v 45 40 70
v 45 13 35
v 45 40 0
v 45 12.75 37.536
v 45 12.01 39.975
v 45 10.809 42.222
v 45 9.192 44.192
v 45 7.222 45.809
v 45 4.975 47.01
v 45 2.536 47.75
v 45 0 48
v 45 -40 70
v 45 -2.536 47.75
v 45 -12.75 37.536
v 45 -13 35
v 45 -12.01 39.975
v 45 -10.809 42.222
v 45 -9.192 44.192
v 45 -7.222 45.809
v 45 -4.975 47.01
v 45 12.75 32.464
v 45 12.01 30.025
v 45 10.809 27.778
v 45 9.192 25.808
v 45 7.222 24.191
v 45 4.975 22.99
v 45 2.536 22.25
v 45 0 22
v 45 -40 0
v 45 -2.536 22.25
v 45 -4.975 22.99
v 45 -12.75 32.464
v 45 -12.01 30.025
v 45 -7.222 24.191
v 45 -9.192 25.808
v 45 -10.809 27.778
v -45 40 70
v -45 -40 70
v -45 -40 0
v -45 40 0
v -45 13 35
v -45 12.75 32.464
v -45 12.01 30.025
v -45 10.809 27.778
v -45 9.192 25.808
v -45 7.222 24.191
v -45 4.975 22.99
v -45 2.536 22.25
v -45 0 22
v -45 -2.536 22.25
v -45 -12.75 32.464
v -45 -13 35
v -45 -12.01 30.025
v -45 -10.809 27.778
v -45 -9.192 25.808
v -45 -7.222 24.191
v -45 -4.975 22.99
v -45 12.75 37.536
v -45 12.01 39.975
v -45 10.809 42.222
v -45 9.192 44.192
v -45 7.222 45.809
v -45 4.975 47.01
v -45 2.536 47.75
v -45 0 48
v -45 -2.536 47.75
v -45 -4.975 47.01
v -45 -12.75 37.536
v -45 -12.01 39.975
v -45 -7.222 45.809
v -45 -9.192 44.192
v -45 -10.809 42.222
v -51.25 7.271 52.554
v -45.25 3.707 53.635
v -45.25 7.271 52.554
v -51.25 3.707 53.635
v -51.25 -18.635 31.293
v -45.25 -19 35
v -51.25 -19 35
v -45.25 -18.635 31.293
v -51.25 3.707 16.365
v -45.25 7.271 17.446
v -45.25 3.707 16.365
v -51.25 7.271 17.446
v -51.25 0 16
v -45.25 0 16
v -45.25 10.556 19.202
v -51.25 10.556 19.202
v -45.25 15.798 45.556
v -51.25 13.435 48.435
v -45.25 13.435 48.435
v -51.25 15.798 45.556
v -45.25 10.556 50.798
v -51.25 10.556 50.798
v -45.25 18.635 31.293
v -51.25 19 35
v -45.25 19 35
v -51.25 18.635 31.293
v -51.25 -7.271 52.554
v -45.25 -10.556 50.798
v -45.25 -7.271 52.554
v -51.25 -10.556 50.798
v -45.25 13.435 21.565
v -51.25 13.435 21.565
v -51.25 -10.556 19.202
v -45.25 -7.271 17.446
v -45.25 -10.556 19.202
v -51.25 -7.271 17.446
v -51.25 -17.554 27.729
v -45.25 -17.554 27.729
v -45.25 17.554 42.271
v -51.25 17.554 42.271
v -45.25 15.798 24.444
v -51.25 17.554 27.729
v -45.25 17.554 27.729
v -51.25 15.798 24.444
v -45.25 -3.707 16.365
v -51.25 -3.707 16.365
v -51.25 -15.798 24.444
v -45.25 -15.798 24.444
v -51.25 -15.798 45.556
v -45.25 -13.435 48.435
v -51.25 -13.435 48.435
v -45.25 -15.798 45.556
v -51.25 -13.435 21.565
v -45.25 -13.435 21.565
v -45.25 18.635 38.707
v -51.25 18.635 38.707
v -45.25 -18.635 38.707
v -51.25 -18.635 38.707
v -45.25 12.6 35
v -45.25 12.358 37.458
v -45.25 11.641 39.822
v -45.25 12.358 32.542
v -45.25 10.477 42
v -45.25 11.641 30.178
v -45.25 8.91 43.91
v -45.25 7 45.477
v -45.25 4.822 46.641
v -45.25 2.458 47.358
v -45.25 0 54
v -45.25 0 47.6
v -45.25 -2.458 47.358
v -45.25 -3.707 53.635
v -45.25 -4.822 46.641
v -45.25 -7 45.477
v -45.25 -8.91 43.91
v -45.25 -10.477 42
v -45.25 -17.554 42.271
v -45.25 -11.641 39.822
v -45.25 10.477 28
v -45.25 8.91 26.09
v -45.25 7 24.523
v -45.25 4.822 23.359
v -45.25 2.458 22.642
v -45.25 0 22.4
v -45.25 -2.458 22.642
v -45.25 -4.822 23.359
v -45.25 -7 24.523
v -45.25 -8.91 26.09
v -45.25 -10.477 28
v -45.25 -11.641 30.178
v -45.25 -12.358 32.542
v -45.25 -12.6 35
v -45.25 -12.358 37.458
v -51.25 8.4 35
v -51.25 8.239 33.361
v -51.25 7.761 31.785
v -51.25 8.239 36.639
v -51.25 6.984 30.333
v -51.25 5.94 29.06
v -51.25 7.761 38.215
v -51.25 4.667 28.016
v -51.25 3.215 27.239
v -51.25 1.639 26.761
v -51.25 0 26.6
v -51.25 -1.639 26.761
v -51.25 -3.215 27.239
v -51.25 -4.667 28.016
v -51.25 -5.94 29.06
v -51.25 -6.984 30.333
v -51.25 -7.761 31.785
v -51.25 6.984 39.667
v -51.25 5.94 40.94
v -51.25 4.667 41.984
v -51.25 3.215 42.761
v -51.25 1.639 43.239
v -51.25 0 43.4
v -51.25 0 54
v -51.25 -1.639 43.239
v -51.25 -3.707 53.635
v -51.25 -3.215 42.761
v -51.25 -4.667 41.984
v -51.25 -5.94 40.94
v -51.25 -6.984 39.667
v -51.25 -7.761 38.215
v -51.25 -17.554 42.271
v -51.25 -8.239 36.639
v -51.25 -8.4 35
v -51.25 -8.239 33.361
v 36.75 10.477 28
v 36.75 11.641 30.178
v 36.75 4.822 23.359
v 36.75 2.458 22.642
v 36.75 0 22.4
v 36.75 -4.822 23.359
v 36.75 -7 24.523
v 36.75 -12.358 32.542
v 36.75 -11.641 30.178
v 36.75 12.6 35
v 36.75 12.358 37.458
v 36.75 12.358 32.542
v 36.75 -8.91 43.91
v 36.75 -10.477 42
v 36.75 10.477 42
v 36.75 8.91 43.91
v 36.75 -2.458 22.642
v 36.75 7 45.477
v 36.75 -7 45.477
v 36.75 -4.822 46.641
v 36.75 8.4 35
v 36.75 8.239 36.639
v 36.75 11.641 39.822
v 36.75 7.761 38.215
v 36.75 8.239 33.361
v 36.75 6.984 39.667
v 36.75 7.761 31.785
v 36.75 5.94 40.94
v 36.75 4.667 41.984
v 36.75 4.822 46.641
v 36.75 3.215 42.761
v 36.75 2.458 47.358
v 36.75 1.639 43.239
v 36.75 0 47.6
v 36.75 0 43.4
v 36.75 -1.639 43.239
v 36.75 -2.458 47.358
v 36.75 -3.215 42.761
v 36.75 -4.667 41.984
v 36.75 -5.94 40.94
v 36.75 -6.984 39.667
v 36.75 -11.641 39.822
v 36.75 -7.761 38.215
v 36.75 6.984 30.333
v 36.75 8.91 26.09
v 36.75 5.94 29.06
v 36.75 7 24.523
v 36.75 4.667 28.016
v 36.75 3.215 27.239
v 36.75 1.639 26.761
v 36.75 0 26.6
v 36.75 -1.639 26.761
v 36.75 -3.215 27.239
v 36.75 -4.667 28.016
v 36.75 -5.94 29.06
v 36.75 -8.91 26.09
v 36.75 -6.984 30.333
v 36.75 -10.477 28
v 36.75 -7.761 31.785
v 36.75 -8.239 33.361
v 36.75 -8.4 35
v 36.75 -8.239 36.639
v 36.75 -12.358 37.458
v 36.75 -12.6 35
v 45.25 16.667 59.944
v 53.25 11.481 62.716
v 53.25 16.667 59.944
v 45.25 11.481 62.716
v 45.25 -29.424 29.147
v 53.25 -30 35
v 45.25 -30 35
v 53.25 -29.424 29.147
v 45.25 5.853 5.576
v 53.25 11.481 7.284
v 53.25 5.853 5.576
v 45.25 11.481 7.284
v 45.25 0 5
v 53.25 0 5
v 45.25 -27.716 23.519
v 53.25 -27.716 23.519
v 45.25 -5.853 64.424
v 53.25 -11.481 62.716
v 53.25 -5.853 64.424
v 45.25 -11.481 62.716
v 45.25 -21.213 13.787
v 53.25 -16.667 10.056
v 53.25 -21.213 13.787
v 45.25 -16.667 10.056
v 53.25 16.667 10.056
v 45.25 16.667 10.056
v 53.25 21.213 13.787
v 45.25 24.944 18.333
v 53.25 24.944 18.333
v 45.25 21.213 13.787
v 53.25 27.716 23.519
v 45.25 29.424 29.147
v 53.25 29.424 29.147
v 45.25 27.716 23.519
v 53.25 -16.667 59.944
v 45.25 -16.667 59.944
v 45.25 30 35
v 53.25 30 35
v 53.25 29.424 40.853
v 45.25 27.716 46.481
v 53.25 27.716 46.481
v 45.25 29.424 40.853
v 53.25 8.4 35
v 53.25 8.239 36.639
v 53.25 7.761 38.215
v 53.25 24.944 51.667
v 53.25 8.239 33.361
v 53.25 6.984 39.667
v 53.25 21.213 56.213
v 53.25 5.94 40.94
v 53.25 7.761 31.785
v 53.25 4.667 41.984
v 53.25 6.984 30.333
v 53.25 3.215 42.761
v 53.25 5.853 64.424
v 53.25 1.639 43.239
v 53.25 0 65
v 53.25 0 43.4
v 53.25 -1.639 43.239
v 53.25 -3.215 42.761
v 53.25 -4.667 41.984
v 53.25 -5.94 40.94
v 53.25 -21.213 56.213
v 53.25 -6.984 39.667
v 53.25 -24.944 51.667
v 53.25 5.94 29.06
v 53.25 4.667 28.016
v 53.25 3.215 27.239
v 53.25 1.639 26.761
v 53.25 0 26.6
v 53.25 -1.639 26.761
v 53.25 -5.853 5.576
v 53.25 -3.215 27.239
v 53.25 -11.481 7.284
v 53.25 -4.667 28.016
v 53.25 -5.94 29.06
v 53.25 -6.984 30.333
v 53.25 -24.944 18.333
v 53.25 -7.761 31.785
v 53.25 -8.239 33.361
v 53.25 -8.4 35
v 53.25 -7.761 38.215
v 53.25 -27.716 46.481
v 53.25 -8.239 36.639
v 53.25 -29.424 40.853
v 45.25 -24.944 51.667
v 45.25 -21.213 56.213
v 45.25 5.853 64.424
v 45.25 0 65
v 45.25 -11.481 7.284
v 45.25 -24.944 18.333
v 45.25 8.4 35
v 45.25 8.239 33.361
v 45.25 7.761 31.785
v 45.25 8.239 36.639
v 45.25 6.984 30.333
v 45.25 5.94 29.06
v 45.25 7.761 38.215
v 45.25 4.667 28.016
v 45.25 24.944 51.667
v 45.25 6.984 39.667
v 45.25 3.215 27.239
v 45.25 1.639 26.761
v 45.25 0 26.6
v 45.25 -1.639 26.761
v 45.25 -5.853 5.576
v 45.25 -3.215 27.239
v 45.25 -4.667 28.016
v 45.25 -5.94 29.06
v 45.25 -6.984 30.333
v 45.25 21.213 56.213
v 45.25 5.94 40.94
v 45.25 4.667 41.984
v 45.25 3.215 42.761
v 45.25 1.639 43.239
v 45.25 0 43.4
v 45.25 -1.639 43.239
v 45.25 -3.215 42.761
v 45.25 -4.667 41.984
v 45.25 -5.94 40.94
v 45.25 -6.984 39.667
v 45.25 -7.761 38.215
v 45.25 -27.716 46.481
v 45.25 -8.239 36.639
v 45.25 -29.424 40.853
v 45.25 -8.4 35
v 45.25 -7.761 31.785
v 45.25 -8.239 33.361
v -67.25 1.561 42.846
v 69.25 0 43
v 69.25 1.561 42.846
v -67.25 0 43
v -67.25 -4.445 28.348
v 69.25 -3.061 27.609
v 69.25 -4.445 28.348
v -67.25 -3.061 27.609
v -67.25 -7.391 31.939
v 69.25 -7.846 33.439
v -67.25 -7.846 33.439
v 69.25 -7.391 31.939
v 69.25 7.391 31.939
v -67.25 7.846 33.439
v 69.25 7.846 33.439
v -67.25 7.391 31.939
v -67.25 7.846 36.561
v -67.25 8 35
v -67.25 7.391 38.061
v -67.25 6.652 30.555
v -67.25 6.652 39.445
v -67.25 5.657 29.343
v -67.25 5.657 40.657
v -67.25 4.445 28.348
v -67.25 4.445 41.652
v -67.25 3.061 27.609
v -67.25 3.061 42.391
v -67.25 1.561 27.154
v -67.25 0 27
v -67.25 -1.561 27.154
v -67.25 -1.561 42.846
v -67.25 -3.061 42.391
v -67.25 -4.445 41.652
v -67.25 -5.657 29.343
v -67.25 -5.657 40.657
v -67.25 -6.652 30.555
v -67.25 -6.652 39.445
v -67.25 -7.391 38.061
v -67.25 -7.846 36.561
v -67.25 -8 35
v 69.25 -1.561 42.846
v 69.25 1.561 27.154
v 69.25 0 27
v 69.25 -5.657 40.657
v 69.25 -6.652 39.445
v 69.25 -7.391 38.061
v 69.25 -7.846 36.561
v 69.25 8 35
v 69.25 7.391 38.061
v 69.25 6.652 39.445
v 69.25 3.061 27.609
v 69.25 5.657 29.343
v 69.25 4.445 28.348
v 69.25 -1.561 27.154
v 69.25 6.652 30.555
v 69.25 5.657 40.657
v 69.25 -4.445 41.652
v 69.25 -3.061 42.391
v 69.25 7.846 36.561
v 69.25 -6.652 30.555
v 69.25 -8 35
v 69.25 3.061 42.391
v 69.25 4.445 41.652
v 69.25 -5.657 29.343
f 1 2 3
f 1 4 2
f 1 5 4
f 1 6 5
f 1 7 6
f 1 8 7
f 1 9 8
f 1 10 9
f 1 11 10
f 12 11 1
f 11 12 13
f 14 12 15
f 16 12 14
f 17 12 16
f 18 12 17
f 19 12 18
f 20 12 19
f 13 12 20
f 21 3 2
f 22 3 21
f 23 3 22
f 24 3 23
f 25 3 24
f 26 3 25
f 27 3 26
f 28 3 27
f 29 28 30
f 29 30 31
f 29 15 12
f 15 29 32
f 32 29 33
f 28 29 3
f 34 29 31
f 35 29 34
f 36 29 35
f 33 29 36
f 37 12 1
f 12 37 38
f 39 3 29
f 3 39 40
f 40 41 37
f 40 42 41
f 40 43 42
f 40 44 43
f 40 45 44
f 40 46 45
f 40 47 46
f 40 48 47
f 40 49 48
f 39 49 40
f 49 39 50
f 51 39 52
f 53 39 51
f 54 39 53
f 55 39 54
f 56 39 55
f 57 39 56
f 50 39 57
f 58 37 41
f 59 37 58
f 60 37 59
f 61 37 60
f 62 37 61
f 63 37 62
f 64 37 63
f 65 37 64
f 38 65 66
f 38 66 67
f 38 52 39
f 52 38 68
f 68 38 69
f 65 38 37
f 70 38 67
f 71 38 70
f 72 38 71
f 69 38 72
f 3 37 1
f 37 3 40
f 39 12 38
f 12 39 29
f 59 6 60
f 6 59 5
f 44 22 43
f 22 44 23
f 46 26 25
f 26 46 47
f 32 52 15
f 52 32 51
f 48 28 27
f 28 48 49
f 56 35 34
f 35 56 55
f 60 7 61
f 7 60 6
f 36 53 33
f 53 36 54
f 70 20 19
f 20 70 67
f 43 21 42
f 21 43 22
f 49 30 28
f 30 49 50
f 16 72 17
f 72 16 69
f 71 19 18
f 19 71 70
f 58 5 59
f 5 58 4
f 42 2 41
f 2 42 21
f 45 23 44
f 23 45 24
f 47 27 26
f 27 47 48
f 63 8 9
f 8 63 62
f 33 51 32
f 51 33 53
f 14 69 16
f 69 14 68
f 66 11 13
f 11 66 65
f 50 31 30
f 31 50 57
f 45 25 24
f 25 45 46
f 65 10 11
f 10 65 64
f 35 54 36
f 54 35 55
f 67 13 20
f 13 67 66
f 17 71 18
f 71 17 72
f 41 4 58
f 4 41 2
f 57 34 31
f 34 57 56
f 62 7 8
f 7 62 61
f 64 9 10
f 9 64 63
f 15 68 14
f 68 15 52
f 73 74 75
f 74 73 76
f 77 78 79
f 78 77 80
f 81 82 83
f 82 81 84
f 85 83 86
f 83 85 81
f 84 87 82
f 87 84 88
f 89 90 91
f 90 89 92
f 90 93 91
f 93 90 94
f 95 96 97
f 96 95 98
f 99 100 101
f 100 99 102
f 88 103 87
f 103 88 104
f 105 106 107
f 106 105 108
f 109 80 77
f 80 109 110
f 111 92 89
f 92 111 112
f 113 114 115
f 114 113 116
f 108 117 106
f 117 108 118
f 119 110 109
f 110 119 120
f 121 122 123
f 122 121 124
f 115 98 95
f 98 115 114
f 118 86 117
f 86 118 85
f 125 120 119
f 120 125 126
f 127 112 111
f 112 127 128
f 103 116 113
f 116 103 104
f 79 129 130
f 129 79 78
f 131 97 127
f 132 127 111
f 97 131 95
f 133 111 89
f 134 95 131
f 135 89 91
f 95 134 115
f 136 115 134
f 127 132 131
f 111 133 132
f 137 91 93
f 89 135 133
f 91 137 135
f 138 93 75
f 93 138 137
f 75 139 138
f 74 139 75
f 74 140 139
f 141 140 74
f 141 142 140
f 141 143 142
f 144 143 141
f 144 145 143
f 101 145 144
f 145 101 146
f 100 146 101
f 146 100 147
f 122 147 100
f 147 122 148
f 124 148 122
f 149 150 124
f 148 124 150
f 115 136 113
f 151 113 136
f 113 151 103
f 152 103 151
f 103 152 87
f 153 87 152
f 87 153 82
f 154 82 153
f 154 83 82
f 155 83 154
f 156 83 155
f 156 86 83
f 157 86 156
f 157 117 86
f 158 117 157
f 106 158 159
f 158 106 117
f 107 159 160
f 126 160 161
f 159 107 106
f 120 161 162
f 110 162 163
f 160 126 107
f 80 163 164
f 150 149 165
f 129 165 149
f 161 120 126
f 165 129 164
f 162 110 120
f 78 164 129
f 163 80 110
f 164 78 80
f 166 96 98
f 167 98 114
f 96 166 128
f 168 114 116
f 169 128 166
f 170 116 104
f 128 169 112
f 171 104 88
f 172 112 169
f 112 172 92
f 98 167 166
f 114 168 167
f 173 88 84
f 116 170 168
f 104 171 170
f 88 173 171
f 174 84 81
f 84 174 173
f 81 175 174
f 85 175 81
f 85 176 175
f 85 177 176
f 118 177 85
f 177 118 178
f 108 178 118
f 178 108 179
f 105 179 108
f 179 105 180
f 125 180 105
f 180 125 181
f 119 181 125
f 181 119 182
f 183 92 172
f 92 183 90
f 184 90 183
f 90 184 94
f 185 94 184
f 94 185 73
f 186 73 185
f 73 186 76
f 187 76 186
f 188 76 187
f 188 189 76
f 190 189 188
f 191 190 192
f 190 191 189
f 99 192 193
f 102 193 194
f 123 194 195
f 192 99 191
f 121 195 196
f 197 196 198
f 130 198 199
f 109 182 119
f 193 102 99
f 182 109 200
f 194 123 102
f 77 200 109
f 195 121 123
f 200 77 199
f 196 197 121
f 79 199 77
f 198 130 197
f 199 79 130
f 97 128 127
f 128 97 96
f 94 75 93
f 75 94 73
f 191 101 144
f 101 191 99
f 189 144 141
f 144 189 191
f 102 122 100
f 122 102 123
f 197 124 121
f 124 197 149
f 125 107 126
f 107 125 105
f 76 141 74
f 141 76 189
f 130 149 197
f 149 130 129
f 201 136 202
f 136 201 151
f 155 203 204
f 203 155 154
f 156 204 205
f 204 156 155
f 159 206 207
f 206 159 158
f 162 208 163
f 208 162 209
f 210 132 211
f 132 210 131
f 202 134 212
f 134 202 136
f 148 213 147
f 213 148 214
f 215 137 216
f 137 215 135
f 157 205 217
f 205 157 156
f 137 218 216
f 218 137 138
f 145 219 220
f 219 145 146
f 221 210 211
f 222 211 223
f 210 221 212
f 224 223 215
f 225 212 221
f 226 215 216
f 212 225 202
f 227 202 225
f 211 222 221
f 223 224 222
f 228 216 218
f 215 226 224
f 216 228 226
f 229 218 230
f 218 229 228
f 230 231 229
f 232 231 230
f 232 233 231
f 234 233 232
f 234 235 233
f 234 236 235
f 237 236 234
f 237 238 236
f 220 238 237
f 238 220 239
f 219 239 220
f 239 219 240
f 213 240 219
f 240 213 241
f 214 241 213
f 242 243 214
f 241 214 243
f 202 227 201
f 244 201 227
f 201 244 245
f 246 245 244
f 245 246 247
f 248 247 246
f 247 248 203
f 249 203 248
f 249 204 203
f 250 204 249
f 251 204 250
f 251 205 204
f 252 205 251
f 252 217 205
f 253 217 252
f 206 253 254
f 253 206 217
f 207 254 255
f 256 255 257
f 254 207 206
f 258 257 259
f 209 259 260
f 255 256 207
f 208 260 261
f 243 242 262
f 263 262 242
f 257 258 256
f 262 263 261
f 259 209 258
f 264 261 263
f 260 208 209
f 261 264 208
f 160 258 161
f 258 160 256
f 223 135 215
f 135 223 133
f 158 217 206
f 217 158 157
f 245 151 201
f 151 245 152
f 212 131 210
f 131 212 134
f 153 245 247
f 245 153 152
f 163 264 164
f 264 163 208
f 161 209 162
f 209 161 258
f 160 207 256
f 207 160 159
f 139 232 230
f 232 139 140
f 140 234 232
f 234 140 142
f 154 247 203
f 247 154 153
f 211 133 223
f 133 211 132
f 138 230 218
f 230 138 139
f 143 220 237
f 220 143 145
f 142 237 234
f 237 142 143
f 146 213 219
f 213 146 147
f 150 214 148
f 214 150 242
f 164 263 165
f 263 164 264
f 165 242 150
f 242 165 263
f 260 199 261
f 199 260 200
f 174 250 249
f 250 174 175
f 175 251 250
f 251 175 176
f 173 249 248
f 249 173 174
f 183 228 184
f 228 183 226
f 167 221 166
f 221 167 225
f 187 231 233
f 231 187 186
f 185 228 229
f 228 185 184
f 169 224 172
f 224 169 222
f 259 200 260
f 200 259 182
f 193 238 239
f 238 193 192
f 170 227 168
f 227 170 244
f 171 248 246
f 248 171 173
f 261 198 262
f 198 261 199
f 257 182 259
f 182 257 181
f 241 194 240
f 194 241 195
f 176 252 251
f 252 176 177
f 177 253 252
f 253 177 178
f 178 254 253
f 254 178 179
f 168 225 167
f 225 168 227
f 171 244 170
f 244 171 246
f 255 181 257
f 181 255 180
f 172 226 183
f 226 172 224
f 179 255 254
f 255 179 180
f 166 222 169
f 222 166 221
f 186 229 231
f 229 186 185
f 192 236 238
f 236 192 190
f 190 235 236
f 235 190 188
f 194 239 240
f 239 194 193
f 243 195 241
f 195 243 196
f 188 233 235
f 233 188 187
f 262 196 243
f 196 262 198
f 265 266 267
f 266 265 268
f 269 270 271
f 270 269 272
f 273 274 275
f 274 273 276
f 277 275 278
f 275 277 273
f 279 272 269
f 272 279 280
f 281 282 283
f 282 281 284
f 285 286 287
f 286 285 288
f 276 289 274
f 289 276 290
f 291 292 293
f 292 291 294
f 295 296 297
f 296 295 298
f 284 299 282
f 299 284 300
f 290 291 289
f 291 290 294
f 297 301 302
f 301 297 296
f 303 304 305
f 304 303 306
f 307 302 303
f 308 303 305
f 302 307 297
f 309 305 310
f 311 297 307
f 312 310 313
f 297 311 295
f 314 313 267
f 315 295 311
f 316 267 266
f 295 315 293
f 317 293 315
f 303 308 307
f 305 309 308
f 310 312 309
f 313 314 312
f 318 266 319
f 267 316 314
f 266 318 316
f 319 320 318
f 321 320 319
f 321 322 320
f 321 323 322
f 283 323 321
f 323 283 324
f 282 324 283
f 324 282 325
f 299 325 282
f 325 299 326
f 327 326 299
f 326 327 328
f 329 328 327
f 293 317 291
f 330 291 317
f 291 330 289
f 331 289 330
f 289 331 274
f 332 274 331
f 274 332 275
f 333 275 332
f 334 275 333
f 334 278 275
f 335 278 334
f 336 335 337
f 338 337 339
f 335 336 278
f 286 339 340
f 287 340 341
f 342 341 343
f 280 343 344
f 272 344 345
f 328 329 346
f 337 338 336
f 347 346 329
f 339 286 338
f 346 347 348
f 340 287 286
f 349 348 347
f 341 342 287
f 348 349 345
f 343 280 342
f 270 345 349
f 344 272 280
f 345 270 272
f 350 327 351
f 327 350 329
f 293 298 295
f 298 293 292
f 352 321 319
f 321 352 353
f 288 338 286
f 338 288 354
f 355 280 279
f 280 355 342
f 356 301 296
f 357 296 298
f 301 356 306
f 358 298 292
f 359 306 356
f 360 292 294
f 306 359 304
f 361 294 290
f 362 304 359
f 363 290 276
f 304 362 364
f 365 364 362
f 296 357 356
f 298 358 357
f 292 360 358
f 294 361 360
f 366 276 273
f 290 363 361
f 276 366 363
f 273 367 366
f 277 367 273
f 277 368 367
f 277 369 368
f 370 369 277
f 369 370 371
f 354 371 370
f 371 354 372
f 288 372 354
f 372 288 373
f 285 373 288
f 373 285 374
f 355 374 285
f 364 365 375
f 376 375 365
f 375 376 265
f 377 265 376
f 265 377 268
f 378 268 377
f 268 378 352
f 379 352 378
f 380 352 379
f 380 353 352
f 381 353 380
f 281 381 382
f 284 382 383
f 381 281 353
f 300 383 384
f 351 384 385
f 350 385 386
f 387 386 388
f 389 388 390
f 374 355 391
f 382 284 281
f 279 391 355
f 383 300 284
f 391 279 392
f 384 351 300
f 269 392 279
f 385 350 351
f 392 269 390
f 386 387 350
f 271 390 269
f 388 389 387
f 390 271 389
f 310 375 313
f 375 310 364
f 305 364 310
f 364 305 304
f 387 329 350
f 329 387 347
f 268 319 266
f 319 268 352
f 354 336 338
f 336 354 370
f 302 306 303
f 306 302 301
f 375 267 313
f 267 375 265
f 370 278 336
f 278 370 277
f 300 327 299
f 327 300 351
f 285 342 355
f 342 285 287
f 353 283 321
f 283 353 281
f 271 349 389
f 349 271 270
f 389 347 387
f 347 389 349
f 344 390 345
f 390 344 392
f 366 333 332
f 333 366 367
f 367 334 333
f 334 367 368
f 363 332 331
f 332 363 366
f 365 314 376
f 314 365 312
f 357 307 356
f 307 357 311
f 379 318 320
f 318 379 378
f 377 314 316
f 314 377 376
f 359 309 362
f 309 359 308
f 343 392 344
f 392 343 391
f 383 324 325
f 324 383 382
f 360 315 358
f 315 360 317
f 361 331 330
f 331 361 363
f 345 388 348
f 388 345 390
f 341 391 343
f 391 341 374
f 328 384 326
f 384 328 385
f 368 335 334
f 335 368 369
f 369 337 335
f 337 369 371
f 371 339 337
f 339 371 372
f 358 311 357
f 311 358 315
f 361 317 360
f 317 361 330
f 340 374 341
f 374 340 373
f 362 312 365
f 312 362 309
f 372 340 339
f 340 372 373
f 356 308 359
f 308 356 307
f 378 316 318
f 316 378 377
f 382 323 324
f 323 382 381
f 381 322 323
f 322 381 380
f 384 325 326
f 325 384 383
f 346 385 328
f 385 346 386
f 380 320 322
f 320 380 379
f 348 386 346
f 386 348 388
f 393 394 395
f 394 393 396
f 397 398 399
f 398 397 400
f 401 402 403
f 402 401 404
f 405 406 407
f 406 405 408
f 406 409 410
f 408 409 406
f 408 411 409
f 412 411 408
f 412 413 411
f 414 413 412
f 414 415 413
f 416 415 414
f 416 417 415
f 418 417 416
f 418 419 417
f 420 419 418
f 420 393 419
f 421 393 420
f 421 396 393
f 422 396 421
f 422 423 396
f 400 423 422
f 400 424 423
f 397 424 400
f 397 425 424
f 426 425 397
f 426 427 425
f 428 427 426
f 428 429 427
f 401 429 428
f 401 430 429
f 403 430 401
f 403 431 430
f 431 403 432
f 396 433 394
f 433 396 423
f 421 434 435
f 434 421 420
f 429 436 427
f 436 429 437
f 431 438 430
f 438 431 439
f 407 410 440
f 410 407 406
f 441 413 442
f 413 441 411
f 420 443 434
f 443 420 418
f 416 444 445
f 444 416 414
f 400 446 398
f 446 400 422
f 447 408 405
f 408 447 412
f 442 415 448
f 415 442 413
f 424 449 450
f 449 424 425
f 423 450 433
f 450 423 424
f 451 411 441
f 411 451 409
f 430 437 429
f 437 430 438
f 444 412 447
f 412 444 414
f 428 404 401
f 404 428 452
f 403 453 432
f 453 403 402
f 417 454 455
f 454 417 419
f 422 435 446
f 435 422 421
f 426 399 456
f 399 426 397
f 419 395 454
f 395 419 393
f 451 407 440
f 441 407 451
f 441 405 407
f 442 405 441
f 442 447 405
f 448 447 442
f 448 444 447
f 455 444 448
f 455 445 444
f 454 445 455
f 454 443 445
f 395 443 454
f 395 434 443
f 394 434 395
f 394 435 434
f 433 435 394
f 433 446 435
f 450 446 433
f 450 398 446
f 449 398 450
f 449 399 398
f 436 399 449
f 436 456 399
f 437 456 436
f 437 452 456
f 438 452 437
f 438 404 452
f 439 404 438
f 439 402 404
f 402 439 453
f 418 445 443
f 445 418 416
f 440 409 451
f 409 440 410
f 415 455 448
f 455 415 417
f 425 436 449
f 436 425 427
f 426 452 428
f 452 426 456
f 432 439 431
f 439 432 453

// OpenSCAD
$fn = 32;

// ------------------------------------------------------------------------
// Bushed housing: 90 x 80 x 70 mm housing, bushing d25.2
// Every part is its own module, assembly() places them once.
// ------------------------------------------------------------------------

// --- part 1 ---
module housing() {
  difference() {
    translate([-45, -40, 0]) cube([90, 80, 70]);
    translate([0, 0, 35]) rotate([0, 90, 0]) cylinder(h = 92, d = 26, center = true);
  }
}

// --- part 2 ---
module bushing() {
  difference() {
    union() {
      cylinder(h = 6, d = 38);
      translate([0, 0, 6]) cylinder(h = 82, d = 25.2);
    }
    translate([0, 0, -1]) cylinder(h = 90, d = 16.8);
  }
}

// --- part 3 ---
module shaft() {
  translate([0, 0, -68.25]) cylinder(h = 136.5, d = 16);
}

// --- part 4 ---
module cover() {
  difference() {
    cylinder(h = 8, d = 60);
    translate([0, 0, -1]) cylinder(h = 10, d = 16.8);
  }
}

// --- assembly ---
module assembly() {
  translate([0, 0, 0]) rotate([0, 0, 0]) housing();
  translate([-51.25, 0, 35]) rotate([0, 90, 0]) bushing();
  translate([1, 0, 35]) rotate([0, 90, 0]) shaft();
  translate([45.25, 0, 35]) rotate([0, 90, 0]) cover();
}

assembly();
